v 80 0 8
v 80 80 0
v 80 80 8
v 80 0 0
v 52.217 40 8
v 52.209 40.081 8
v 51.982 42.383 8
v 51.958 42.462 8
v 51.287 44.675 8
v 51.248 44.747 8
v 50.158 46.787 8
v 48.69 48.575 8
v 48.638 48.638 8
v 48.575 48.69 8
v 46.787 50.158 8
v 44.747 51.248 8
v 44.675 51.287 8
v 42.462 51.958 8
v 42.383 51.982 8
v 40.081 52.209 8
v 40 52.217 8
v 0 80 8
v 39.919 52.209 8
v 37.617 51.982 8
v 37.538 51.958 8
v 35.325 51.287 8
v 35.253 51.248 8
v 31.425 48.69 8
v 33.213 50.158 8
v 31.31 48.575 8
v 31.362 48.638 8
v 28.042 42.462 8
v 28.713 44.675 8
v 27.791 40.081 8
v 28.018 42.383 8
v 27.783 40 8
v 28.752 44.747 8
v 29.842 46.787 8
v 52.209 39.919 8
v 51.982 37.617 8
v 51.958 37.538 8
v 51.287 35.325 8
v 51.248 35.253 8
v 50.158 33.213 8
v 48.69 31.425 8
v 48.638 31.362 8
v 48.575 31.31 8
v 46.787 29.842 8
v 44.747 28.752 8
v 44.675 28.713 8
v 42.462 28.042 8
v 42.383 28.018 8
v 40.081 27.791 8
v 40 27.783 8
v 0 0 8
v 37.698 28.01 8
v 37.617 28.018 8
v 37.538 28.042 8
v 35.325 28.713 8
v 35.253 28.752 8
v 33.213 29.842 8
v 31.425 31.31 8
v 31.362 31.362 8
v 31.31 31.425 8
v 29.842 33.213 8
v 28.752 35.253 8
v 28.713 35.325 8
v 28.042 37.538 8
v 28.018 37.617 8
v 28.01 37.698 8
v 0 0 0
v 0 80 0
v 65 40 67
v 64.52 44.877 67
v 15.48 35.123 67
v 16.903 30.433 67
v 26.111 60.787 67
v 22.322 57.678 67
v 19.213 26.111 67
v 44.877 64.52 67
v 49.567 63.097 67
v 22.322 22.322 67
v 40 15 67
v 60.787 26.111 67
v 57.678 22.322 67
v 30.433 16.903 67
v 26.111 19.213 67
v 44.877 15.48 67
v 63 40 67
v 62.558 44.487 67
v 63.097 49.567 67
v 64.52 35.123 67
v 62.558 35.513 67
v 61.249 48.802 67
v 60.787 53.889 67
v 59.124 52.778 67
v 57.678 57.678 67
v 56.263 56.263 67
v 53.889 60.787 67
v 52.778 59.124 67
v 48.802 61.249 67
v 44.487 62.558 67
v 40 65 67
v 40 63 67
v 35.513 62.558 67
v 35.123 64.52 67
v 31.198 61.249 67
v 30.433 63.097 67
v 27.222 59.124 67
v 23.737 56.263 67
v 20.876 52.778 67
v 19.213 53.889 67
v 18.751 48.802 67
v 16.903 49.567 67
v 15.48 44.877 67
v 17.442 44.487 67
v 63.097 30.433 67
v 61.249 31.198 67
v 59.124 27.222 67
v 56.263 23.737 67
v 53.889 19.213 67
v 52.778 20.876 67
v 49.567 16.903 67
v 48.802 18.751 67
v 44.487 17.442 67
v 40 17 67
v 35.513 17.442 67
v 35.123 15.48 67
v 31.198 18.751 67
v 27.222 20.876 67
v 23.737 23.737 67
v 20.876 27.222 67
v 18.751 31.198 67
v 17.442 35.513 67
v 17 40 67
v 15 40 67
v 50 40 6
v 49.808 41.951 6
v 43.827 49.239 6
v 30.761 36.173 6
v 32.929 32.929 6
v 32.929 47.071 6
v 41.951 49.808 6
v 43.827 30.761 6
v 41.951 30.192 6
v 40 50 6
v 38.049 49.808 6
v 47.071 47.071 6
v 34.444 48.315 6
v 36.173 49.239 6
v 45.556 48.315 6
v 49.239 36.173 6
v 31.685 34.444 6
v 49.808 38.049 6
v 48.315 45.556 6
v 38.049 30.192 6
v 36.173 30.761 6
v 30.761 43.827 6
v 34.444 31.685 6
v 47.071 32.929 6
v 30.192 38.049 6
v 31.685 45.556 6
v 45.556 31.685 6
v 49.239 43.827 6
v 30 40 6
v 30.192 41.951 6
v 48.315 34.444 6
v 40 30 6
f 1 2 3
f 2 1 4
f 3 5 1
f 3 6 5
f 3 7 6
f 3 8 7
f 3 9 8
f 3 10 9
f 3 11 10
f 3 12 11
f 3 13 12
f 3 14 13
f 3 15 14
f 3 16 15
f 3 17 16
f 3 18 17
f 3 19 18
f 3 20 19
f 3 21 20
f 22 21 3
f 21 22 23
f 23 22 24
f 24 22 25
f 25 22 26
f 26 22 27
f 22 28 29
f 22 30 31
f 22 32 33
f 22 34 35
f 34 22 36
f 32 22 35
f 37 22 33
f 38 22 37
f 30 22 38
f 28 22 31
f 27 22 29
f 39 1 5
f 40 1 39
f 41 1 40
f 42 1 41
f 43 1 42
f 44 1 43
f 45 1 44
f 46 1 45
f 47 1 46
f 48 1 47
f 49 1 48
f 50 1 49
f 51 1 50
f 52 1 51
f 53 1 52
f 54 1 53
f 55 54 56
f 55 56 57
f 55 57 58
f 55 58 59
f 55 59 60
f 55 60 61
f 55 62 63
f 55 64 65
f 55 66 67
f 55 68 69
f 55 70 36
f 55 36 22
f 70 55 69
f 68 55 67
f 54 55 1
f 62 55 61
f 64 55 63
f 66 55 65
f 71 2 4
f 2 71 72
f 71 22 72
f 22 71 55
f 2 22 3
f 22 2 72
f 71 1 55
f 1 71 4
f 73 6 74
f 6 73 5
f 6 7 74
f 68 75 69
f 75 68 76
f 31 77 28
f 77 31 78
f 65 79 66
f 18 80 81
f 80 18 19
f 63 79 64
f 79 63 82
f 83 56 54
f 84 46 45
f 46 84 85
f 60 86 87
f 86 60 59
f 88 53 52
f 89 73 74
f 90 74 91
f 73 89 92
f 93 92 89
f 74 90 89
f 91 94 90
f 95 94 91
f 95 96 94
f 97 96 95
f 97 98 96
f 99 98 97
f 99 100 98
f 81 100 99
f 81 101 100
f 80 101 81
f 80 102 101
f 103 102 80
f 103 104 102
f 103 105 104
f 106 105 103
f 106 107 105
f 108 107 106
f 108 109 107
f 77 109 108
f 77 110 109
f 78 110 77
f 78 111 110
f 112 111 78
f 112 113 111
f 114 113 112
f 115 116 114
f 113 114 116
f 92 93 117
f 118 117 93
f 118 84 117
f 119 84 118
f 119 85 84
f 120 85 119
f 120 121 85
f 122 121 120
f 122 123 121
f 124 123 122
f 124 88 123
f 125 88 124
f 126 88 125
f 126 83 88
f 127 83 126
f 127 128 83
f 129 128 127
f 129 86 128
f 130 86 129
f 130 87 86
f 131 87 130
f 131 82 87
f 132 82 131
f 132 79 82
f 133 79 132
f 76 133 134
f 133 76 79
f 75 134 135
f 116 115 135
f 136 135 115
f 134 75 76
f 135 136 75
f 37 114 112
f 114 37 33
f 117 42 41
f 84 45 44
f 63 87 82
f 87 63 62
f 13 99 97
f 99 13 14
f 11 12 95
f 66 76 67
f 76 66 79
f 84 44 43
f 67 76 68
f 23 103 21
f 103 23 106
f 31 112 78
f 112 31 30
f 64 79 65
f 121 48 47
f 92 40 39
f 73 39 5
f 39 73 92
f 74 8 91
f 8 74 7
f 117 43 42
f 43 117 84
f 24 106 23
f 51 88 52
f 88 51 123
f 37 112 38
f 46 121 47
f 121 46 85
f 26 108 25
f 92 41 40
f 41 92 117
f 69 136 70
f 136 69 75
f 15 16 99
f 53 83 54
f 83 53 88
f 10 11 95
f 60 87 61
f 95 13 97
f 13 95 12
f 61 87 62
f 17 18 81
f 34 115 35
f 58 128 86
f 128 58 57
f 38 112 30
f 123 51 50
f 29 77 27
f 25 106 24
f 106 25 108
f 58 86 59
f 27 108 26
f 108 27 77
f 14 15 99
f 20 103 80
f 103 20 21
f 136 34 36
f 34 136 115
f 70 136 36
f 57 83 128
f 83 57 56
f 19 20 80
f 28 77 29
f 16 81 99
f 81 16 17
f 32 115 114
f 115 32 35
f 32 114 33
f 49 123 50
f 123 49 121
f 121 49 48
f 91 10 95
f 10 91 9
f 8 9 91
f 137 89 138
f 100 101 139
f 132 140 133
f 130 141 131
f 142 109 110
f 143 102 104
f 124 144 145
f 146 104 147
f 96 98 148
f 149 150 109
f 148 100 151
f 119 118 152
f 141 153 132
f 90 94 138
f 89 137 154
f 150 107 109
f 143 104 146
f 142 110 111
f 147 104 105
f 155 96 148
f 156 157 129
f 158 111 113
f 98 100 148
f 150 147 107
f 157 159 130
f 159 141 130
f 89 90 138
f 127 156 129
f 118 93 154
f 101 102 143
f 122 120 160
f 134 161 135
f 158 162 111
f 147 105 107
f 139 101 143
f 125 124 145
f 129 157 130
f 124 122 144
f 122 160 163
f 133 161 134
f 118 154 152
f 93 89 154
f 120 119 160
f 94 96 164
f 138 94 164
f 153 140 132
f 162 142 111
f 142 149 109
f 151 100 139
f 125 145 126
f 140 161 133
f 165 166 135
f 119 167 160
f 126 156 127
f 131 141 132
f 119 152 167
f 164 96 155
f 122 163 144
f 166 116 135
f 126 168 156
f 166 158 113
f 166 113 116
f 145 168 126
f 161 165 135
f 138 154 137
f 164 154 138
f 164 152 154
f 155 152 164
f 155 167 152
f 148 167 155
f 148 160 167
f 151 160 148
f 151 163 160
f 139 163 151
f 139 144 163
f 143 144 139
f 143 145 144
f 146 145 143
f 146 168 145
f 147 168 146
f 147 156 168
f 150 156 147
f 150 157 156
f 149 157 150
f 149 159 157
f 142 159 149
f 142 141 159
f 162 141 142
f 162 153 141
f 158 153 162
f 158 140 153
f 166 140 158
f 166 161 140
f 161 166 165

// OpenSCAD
$fn = 32;

// ----------------------------------------------------------------------
// Hopper: funnel with square flange
// ----------------------------------------------------------------------

// --- parameters (mm) ---
fl = 80;                  // flange side, X and Y
fl_t = 8;                 // flange thickness
cone_h = 60;              // cone height above the flange
top_d = 50;               // cone mouth diameter
bot_d = 24;               // cone spout diameter
wall = 2;                 // cone wall thickness

bore_d = bot_d - 2 * wall;  // spout bore diameter
total_h = fl_t + cone_h - 1;  // overall height

difference() {
  union() {
    cube([fl, fl, fl_t]);
    translate([fl / 2, fl / 2, fl_t - 1])
      cylinder(h = cone_h, d1 = bot_d, d2 = top_d);
  }
  translate([fl / 2, fl / 2, fl_t - 2])
    cylinder(h = cone_h + 1, d1 = bore_d, d2 = top_d - 2 * wall);
}
